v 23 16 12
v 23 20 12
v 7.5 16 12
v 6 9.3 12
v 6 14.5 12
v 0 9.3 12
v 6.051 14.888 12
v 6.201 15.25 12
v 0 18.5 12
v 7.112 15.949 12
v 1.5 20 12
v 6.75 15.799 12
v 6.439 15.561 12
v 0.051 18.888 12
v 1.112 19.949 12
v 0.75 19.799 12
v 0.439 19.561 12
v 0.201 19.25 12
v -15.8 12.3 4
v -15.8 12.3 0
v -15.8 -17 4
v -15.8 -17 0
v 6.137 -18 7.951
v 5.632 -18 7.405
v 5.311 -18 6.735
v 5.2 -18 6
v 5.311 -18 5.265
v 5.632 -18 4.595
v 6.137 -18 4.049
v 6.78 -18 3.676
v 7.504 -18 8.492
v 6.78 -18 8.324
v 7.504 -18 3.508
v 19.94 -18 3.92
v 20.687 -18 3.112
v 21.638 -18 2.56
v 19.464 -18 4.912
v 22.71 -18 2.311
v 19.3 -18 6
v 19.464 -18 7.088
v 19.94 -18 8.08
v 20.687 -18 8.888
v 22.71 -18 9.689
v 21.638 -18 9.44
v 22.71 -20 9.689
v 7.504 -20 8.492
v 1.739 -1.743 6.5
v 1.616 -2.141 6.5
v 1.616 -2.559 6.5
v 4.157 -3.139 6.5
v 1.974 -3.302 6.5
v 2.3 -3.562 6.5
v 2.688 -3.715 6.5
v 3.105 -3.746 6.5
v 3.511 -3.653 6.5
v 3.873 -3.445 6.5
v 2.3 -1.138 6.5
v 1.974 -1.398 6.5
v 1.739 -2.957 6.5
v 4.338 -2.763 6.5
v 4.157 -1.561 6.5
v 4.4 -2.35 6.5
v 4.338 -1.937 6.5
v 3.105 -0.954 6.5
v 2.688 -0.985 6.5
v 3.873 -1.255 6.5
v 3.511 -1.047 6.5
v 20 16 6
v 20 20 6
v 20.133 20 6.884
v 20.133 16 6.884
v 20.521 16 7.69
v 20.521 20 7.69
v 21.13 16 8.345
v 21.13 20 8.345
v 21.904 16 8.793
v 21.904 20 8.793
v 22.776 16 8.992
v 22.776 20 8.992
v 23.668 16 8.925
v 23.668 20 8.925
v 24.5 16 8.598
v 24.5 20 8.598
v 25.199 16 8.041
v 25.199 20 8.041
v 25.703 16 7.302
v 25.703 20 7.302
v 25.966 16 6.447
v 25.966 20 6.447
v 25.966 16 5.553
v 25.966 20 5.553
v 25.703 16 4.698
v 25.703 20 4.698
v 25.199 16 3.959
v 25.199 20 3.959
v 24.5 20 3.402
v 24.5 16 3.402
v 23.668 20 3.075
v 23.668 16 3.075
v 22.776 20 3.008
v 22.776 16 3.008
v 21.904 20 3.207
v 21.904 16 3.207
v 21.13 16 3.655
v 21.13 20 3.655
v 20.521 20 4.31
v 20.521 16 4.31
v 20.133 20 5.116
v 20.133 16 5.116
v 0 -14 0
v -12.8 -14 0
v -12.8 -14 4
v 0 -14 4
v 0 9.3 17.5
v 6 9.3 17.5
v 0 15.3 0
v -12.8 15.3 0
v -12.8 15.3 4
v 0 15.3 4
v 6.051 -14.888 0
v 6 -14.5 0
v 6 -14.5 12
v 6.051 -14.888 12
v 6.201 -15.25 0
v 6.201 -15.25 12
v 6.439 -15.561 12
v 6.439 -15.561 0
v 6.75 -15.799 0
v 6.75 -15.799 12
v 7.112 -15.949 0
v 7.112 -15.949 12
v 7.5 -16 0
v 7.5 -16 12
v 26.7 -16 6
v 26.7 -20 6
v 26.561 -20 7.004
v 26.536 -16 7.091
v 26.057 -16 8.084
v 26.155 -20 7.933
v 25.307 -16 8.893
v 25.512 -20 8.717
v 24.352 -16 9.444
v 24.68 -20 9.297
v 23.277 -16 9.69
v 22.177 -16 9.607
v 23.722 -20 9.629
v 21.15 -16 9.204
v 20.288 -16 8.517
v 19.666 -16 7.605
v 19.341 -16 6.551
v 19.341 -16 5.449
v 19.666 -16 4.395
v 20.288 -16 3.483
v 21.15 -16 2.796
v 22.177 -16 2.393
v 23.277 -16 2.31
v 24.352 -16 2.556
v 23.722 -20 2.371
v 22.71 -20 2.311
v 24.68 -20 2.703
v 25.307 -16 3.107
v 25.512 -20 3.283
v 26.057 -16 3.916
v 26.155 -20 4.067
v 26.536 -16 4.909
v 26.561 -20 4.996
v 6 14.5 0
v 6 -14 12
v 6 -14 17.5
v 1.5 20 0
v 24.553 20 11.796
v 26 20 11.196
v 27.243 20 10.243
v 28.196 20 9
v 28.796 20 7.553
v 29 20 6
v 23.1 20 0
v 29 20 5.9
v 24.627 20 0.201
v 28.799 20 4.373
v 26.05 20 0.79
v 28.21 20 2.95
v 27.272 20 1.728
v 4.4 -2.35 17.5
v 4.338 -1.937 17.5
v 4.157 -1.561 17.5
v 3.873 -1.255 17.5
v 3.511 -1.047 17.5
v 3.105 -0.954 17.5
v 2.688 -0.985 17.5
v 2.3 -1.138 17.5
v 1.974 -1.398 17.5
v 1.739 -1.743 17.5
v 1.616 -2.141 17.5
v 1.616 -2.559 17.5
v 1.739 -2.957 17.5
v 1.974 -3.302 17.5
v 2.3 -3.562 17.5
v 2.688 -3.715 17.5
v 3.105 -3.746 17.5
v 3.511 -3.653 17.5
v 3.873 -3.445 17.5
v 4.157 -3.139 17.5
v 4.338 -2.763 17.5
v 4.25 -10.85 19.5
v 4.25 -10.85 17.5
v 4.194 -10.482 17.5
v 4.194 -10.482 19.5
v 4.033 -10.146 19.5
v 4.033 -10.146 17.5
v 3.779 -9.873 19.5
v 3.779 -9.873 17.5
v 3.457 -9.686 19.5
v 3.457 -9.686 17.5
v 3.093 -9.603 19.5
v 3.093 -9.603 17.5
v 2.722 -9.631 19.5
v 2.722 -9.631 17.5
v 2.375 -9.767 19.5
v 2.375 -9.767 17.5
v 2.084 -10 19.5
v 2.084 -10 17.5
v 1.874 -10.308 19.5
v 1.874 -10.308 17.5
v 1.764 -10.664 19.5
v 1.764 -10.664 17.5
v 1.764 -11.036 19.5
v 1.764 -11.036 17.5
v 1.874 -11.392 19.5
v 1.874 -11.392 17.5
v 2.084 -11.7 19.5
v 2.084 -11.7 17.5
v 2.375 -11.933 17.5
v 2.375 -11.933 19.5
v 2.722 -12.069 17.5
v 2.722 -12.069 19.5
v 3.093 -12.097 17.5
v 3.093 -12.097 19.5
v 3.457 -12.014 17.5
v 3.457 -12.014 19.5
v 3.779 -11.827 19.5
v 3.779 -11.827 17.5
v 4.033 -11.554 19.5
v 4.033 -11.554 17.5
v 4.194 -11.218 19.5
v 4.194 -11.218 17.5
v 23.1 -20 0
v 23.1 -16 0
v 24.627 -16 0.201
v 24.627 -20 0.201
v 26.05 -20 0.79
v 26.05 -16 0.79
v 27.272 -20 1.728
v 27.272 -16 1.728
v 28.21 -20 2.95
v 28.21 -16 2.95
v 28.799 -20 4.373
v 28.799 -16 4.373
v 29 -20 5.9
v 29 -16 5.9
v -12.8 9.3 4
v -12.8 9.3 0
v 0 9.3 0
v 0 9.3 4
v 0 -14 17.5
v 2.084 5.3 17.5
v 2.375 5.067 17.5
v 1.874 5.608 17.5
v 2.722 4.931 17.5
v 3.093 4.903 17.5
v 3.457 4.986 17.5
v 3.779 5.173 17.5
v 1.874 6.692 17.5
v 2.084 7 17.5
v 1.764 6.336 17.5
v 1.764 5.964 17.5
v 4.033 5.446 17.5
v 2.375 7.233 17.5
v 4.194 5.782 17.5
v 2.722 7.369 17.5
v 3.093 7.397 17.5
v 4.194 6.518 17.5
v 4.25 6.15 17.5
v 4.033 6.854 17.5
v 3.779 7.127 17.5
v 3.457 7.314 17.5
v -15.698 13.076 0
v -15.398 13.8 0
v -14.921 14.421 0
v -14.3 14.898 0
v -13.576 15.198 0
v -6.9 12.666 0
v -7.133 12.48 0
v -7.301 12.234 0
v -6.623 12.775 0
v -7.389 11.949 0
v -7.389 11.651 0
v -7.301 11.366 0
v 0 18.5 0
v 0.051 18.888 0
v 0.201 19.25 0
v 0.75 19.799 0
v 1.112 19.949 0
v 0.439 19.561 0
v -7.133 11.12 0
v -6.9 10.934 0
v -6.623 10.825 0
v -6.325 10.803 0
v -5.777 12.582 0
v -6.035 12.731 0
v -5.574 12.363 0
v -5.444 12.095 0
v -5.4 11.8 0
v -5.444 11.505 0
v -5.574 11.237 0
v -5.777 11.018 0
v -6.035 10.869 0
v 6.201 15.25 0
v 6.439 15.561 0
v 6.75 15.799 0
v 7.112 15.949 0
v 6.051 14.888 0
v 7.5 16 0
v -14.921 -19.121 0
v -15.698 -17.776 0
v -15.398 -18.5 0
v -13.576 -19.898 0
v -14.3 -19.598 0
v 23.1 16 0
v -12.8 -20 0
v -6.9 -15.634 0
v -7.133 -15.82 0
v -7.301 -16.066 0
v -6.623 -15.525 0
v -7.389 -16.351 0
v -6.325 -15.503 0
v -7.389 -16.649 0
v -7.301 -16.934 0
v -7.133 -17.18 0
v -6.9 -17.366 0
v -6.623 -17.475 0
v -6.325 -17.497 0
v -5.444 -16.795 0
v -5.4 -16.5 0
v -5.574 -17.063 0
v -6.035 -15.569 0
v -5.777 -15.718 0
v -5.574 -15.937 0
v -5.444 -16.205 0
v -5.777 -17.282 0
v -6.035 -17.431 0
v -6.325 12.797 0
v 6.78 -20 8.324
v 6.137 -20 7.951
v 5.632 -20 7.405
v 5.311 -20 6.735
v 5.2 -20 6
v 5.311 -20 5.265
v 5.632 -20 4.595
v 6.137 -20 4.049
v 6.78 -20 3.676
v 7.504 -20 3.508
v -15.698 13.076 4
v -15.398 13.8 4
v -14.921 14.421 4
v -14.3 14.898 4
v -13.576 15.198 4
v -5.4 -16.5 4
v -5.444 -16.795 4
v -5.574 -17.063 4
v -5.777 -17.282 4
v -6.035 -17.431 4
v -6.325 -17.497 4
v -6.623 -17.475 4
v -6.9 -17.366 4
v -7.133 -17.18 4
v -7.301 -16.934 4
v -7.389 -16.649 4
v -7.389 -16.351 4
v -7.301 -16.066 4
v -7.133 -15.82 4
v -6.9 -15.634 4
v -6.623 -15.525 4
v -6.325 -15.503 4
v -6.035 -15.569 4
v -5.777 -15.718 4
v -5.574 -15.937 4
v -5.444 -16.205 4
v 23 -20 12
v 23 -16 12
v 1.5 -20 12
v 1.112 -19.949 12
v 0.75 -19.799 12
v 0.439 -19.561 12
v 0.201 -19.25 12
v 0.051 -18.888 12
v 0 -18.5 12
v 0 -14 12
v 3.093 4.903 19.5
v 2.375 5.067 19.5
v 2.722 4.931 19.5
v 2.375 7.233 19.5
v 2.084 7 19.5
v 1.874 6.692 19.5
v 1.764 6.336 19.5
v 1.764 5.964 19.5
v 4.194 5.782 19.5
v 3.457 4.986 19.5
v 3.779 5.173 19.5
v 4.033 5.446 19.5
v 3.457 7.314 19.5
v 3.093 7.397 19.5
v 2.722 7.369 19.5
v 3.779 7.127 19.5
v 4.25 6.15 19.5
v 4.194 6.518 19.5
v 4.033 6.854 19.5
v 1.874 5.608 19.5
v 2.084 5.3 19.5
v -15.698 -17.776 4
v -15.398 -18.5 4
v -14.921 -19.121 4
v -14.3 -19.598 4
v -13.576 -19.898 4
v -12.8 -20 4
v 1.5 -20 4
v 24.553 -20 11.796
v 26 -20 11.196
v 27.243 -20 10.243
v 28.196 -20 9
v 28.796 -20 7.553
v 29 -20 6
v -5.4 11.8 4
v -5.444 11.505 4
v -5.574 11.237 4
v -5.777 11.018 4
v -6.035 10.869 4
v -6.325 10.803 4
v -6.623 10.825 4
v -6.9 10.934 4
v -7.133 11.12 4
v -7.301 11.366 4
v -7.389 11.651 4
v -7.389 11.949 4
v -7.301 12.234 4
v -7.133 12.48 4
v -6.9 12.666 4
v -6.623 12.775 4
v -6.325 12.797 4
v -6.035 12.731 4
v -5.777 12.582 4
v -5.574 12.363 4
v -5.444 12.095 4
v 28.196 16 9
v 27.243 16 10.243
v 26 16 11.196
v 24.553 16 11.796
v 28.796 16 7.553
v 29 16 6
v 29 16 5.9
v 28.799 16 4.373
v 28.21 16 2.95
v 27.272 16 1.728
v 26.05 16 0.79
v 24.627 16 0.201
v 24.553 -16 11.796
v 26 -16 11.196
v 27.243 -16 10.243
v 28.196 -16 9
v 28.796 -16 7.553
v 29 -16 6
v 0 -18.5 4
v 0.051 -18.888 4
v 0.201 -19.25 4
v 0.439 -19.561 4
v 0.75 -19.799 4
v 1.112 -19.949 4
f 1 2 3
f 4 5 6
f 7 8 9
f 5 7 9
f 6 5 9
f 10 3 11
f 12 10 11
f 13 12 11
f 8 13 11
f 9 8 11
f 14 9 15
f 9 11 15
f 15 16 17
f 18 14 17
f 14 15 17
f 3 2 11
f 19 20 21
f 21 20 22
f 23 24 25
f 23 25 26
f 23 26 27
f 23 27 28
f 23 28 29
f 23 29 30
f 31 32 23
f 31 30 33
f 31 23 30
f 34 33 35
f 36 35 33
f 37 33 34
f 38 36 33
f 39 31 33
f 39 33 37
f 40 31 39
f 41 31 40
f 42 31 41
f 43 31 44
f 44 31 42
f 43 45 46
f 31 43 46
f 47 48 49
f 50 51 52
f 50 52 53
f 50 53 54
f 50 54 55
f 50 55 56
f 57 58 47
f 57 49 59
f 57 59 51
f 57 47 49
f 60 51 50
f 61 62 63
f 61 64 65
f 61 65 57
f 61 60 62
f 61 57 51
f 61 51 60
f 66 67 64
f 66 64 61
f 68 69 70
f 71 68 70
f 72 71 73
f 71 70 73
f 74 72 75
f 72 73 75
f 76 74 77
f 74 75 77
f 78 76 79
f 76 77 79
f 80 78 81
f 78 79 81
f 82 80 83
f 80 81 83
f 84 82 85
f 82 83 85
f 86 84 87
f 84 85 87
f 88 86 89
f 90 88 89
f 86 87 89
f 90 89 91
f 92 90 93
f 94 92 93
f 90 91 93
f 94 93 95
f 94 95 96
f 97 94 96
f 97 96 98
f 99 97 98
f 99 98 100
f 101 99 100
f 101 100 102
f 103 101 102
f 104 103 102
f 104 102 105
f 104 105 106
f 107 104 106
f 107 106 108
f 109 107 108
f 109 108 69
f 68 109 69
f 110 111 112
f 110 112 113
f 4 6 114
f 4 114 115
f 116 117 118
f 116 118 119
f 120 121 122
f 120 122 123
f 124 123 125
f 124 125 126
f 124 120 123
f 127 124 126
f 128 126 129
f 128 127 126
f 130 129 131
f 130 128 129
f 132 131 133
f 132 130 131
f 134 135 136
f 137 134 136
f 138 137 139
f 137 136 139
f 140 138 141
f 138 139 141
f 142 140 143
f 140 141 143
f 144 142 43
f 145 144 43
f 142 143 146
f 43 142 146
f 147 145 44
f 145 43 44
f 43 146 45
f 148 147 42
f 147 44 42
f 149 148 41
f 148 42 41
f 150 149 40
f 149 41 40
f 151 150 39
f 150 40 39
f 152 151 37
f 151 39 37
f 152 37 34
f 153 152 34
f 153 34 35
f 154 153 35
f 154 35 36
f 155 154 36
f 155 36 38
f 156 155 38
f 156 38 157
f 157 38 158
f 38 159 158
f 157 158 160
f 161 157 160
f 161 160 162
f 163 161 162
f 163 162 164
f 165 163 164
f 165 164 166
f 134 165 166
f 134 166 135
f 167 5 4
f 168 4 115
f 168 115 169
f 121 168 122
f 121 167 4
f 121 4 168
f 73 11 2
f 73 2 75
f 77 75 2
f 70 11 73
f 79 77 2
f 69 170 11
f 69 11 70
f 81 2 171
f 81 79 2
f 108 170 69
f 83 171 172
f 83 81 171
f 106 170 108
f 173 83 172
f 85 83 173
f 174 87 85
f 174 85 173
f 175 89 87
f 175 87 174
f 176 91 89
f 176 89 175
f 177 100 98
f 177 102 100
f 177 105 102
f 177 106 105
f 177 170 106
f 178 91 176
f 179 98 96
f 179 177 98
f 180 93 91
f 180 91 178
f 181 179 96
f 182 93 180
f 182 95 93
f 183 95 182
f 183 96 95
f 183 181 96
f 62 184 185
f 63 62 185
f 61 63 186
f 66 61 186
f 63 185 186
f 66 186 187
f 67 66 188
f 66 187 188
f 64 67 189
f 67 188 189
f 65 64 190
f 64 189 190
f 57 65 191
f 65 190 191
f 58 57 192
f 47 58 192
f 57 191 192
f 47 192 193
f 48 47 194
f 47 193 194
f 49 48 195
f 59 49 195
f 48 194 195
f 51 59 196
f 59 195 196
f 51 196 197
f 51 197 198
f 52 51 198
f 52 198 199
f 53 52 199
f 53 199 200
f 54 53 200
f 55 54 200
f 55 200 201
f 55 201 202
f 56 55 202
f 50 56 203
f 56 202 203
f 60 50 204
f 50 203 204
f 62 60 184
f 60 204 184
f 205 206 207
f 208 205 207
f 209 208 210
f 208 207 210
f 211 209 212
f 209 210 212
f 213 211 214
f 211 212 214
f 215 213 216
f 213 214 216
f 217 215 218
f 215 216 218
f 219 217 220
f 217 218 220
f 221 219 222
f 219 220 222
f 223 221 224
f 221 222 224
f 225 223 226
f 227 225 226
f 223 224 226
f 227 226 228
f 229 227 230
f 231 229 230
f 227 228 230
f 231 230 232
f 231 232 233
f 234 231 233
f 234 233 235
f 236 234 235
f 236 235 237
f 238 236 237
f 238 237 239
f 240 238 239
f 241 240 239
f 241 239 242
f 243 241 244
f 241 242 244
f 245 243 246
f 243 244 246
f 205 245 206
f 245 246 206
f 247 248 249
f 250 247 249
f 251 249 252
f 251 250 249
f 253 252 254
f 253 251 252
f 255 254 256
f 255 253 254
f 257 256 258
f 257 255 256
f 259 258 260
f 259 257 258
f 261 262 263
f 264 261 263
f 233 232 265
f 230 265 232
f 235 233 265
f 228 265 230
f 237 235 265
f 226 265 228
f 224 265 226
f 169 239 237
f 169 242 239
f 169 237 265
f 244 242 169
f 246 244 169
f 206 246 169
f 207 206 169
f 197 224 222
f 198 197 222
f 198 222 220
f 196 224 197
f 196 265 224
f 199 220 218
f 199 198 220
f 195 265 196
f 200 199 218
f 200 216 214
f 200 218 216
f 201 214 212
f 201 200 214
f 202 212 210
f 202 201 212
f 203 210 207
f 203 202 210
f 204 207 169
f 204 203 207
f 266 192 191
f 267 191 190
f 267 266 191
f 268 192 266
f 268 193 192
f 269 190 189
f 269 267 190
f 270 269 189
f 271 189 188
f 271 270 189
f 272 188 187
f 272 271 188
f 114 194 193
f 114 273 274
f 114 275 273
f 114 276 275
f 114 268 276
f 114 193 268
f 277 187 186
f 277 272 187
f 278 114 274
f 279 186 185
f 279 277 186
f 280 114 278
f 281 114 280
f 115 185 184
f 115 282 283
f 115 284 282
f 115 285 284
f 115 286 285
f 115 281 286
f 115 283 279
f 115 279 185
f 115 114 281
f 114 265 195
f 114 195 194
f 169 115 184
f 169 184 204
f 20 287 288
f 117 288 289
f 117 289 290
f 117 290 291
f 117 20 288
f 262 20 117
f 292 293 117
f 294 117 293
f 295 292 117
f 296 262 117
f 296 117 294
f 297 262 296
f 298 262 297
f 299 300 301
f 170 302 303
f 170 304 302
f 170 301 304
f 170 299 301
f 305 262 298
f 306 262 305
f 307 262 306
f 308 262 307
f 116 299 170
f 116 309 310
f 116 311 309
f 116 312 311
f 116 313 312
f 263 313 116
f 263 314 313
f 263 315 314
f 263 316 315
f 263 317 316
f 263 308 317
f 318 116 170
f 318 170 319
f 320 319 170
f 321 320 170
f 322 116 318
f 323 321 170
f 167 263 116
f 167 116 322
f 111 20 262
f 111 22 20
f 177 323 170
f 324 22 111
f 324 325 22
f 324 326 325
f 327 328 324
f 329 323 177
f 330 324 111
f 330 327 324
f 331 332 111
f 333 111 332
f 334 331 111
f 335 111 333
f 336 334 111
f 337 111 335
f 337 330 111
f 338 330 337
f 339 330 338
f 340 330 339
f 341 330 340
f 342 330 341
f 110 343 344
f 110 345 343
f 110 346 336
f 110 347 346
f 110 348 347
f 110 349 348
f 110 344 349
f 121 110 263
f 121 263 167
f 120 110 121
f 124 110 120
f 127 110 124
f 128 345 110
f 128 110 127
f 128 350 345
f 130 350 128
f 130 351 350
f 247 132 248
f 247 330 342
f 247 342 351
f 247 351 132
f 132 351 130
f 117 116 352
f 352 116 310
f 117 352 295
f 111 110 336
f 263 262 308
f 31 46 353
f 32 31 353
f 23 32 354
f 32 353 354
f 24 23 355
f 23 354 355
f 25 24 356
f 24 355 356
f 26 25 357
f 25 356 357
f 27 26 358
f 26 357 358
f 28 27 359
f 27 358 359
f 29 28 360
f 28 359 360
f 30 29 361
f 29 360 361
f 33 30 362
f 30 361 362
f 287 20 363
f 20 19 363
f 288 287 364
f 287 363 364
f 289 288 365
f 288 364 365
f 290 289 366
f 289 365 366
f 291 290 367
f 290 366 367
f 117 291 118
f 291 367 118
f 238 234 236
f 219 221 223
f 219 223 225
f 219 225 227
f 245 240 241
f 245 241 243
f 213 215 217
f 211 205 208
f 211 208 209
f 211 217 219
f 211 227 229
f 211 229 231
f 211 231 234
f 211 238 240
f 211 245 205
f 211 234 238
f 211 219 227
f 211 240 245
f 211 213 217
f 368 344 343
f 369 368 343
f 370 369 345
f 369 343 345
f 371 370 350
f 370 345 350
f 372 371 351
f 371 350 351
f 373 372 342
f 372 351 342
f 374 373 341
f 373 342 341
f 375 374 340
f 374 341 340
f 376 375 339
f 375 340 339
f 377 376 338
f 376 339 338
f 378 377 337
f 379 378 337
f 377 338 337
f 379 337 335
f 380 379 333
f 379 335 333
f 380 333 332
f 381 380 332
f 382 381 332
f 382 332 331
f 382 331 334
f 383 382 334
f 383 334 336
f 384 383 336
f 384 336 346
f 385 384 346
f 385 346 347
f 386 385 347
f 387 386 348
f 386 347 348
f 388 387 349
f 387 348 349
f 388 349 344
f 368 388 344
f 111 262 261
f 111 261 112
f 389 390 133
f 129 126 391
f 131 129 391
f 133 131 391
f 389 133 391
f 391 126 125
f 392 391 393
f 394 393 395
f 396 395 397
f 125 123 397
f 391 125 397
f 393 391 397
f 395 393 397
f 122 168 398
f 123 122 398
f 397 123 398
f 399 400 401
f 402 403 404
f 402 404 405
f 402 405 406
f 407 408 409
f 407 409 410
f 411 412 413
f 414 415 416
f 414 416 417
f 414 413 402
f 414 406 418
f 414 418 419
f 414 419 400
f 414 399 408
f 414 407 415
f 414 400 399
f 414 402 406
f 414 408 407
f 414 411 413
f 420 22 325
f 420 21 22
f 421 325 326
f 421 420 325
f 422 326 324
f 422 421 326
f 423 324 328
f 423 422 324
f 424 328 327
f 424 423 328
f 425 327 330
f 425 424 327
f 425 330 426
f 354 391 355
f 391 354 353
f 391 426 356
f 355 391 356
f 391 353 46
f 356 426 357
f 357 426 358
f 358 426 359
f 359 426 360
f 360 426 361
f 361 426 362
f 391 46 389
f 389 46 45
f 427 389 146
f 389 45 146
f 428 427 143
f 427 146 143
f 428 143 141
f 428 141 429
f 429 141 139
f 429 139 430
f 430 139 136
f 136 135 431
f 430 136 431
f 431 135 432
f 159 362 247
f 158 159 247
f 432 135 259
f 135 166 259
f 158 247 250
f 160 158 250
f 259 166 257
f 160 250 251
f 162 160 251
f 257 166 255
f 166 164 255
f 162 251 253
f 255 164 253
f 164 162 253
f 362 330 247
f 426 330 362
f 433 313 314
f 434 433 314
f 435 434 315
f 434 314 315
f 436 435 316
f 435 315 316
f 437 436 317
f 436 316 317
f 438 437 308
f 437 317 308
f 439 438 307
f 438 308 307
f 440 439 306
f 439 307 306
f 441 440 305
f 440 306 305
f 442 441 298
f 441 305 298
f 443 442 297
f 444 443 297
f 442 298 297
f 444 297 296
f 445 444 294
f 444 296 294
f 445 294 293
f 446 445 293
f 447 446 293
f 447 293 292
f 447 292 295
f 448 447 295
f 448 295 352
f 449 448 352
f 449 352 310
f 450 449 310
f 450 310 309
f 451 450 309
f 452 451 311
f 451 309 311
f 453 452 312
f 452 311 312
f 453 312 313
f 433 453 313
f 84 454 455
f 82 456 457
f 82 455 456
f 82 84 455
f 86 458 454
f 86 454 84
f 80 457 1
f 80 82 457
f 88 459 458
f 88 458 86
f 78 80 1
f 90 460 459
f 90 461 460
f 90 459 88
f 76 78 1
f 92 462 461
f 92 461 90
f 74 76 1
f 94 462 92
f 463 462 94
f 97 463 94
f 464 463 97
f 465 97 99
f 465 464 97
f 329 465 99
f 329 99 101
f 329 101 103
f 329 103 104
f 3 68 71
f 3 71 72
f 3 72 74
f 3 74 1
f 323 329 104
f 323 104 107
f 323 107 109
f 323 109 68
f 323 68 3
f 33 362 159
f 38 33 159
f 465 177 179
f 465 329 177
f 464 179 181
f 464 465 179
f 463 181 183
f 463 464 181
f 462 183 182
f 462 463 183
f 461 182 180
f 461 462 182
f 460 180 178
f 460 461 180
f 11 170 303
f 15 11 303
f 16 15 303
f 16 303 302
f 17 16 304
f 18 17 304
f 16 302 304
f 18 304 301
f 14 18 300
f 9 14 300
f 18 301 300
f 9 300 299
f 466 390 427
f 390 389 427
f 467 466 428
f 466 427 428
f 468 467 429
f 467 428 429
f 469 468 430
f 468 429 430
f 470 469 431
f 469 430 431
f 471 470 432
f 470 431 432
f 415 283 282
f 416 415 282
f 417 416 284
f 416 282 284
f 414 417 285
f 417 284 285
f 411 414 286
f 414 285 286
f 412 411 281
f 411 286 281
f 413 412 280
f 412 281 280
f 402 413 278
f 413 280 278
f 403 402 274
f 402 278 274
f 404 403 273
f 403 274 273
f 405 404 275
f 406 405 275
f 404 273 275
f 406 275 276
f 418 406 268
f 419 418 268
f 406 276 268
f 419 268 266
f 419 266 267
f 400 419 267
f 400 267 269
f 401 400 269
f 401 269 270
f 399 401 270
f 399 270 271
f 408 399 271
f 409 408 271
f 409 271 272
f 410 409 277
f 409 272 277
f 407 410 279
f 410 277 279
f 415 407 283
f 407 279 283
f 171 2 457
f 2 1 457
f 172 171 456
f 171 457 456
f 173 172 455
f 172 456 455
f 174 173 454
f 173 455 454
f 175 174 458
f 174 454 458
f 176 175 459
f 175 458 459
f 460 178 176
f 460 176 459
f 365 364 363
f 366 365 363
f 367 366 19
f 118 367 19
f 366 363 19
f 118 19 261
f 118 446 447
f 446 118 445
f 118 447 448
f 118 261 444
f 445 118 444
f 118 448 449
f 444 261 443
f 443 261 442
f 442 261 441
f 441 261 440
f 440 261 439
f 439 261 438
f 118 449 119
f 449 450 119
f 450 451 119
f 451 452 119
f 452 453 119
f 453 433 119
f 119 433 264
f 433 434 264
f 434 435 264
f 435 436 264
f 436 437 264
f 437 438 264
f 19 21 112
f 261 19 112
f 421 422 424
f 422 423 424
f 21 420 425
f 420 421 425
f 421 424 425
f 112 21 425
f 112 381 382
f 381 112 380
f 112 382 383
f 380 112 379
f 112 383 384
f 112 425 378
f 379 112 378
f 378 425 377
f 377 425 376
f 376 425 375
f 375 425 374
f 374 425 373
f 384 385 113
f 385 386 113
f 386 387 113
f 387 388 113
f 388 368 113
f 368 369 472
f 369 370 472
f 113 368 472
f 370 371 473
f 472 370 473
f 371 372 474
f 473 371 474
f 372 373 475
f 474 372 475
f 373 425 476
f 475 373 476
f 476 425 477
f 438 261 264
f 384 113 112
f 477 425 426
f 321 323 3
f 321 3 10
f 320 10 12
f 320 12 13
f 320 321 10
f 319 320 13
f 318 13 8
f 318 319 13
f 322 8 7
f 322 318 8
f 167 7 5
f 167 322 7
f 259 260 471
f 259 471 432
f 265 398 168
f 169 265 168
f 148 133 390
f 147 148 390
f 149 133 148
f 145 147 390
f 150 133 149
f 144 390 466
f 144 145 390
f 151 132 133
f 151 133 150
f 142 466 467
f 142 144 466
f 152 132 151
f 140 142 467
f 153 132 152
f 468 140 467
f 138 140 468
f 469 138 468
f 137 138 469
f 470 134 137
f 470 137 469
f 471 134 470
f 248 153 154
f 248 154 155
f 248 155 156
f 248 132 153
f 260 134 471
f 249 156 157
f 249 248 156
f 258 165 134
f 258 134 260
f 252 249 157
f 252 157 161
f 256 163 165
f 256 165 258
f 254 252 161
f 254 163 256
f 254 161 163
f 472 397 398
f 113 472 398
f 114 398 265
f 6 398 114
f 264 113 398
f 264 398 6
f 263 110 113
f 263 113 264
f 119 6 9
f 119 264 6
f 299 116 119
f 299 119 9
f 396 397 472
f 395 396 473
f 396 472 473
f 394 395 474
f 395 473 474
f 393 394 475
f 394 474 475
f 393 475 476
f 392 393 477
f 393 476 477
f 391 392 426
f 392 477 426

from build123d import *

# Parameters (mm, degrees)
PAD_DEPTH       = 12
SKETCH001_R     = 3.7
POCKET_DEPTH    = 5
SKETCH002_R     = 3
POCKET001_DEPTH = 5
POCKET002_DEPTH = 2
SKETCH004_W     = 21.8
SKETCH004_H     = 35.3
SKETCH004_R     = 1
SKETCH004_W_2   = 12.8
SKETCH004_H_2   = 23.3
PAD001_DEPTH    = 4
FILLET_R        = 3
FILLET001_R     = 3
SKETCH005_W     = 6
SKETCH005_H     = 23.3
PAD002_DEPTH    = 13.5
SKETCH006_R     = 1.25
PAD003_DEPTH    = 2
SKETCH007_R     = 1.4
POCKET003_DEPTH = 11
FILLET002_R     = 6
FILLET003_R     = 6
FILLET004_R     = 5.9
FILLET005_R     = 5.9


with BuildPart() as part:
    # Sketch → Pad (new body)
    with BuildSketch(Plane.XY):
        with BuildLine():
            Line((1.5, 20), (29, 20))
            Line((29, 20), (29, 16))
            Line((29, 16), (7.5, 16))
            ThreePointArc((7.5, 16), (6.43934, 15.56066), (6, 14.5))
            Line((6, 14.5), (6, -14.5))
            ThreePointArc((6, -14.5), (6.43934, -15.56066), (7.5, -16))
            Line((7.5, -16), (29, -16))
            Line((29, -16), (29, -20))
            Line((29, -20), (1.5, -20))
            ThreePointArc((0, -18.5), (0.43934, -19.56066), (1.5, -20))
            Line((0, -18.5), (0, 18.5))
            ThreePointArc((1.5, 20), (0.43934, 19.56066), (0, 18.5))
        make_face()
    extrude(amount=PAD_DEPTH)

    # Sketch001 (on Face9 of Pad) → Pocket (cut)
    with BuildSketch(Plane.XZ.offset(20)):
        with Locations((23, 6)):
            Circle(SKETCH001_R)
    extrude(amount=-POCKET_DEPTH, mode=Mode.SUBTRACT)

    # Sketch002 (on Face1 of Pocket) → Pocket001 (cut)
    with BuildSketch(Plane(origin=(0, 20, 0), x_dir=(-1, 0, 0), z_dir=(0, 1, 0))):
        with Locations((-23, 6)):
            Circle(SKETCH002_R)
    extrude(amount=-POCKET001_DEPTH, mode=Mode.SUBTRACT)

    # Sketch003 (on Face14 of Pocket001) → Pocket002 (cut)
    with BuildSketch(Plane.XZ.offset(20)):
        with BuildLine():
            ThreePointArc((7.503922, 8.492299), (5.2, 6), (7.503922, 3.507701))
            Line((7.503922, 3.507701), (22.709804, 2.311398))
            ThreePointArc((22.709804, 2.311398), (26.7, 6), (22.709804, 9.688602))
            Line((22.709804, 9.688602), (7.503922, 8.492299))
        make_face()
    extrude(amount=-POCKET002_DEPTH, mode=Mode.SUBTRACT)

    # Sketch004 (on Face3 of Pocket002) → Pad001 (join)
    with BuildSketch(Plane(origin=(0, 0, 0), x_dir=(1, 0, 0), z_dir=(0, 0, -1))):
        with Locations((-4.9, 2.35)):
            Rectangle(SKETCH004_W, SKETCH004_H)
        with Locations((-6.4, -11.8)):
            Circle(SKETCH004_R, mode=Mode.SUBTRACT)
        with Locations((-6.4, 16.5)):
            Circle(SKETCH004_R, mode=Mode.SUBTRACT)
        with Locations((-6.4, 2.35)):
            Rectangle(SKETCH004_W_2, SKETCH004_H_2, mode=Mode.SUBTRACT)
    extrude(amount=-PAD001_DEPTH)

    # Fillet
    fillet_edges = [part.edges().sort_by_distance(p)[0] for p in [
        (-15.8, -20, 2),
    ]]
    fillet(fillet_edges, radius=FILLET_R)

    # Fillet001
    fillet001_edges = [part.edges().sort_by_distance(p)[0] for p in [
        (-15.8, 15.3, 2),
    ]]
    fillet(fillet001_edges, radius=FILLET001_R)

    # Sketch005 (on Face1 of Fillet001) → Pad002 (join)
    with BuildSketch(Plane.XY.offset(4)):
        with Locations((3, -2.35)):
            Rectangle(SKETCH005_W, SKETCH005_H)
    extrude(amount=PAD002_DEPTH)

    # Sketch006 (on Face47 of Pad002) → Pad003 (join)
    with BuildSketch(Plane.XY.offset(17.5)):
        with Locations((3, 6.15)):
            Circle(SKETCH006_R)
        with Locations((3, -10.85)):
            Circle(SKETCH006_R)
    extrude(amount=PAD003_DEPTH)

    # Sketch007 (on Face47 of Pad003) → Pocket003 (cut)
    with BuildSketch(Plane.XY.offset(17.5)):
        with Locations((3, -2.35)):
            Circle(SKETCH007_R)
    extrude(amount=-POCKET003_DEPTH, mode=Mode.SUBTRACT)

    # Fillet002
    fillet002_edges = [part.edges().sort_by_distance(p)[0] for p in [
        (29, -18, 12),
    ]]
    fillet(fillet002_edges, radius=FILLET002_R)

    # Fillet003
    fillet003_edges = [part.edges().sort_by_distance(p)[0] for p in [
        (29, 18, 12),
    ]]
    fillet(fillet003_edges, radius=FILLET003_R)

    # Fillet004
    fillet004_edges = [part.edges().sort_by_distance(p)[0] for p in [
        (29, -18, 0),
    ]]
    fillet(fillet004_edges, radius=FILLET004_R)

    # Fillet005
    fillet005_edges = [part.edges().sort_by_distance(p)[0] for p in [
        (29, 18, 0),
    ]]
    fillet(fillet005_edges, radius=FILLET005_R)


solid = part.part
